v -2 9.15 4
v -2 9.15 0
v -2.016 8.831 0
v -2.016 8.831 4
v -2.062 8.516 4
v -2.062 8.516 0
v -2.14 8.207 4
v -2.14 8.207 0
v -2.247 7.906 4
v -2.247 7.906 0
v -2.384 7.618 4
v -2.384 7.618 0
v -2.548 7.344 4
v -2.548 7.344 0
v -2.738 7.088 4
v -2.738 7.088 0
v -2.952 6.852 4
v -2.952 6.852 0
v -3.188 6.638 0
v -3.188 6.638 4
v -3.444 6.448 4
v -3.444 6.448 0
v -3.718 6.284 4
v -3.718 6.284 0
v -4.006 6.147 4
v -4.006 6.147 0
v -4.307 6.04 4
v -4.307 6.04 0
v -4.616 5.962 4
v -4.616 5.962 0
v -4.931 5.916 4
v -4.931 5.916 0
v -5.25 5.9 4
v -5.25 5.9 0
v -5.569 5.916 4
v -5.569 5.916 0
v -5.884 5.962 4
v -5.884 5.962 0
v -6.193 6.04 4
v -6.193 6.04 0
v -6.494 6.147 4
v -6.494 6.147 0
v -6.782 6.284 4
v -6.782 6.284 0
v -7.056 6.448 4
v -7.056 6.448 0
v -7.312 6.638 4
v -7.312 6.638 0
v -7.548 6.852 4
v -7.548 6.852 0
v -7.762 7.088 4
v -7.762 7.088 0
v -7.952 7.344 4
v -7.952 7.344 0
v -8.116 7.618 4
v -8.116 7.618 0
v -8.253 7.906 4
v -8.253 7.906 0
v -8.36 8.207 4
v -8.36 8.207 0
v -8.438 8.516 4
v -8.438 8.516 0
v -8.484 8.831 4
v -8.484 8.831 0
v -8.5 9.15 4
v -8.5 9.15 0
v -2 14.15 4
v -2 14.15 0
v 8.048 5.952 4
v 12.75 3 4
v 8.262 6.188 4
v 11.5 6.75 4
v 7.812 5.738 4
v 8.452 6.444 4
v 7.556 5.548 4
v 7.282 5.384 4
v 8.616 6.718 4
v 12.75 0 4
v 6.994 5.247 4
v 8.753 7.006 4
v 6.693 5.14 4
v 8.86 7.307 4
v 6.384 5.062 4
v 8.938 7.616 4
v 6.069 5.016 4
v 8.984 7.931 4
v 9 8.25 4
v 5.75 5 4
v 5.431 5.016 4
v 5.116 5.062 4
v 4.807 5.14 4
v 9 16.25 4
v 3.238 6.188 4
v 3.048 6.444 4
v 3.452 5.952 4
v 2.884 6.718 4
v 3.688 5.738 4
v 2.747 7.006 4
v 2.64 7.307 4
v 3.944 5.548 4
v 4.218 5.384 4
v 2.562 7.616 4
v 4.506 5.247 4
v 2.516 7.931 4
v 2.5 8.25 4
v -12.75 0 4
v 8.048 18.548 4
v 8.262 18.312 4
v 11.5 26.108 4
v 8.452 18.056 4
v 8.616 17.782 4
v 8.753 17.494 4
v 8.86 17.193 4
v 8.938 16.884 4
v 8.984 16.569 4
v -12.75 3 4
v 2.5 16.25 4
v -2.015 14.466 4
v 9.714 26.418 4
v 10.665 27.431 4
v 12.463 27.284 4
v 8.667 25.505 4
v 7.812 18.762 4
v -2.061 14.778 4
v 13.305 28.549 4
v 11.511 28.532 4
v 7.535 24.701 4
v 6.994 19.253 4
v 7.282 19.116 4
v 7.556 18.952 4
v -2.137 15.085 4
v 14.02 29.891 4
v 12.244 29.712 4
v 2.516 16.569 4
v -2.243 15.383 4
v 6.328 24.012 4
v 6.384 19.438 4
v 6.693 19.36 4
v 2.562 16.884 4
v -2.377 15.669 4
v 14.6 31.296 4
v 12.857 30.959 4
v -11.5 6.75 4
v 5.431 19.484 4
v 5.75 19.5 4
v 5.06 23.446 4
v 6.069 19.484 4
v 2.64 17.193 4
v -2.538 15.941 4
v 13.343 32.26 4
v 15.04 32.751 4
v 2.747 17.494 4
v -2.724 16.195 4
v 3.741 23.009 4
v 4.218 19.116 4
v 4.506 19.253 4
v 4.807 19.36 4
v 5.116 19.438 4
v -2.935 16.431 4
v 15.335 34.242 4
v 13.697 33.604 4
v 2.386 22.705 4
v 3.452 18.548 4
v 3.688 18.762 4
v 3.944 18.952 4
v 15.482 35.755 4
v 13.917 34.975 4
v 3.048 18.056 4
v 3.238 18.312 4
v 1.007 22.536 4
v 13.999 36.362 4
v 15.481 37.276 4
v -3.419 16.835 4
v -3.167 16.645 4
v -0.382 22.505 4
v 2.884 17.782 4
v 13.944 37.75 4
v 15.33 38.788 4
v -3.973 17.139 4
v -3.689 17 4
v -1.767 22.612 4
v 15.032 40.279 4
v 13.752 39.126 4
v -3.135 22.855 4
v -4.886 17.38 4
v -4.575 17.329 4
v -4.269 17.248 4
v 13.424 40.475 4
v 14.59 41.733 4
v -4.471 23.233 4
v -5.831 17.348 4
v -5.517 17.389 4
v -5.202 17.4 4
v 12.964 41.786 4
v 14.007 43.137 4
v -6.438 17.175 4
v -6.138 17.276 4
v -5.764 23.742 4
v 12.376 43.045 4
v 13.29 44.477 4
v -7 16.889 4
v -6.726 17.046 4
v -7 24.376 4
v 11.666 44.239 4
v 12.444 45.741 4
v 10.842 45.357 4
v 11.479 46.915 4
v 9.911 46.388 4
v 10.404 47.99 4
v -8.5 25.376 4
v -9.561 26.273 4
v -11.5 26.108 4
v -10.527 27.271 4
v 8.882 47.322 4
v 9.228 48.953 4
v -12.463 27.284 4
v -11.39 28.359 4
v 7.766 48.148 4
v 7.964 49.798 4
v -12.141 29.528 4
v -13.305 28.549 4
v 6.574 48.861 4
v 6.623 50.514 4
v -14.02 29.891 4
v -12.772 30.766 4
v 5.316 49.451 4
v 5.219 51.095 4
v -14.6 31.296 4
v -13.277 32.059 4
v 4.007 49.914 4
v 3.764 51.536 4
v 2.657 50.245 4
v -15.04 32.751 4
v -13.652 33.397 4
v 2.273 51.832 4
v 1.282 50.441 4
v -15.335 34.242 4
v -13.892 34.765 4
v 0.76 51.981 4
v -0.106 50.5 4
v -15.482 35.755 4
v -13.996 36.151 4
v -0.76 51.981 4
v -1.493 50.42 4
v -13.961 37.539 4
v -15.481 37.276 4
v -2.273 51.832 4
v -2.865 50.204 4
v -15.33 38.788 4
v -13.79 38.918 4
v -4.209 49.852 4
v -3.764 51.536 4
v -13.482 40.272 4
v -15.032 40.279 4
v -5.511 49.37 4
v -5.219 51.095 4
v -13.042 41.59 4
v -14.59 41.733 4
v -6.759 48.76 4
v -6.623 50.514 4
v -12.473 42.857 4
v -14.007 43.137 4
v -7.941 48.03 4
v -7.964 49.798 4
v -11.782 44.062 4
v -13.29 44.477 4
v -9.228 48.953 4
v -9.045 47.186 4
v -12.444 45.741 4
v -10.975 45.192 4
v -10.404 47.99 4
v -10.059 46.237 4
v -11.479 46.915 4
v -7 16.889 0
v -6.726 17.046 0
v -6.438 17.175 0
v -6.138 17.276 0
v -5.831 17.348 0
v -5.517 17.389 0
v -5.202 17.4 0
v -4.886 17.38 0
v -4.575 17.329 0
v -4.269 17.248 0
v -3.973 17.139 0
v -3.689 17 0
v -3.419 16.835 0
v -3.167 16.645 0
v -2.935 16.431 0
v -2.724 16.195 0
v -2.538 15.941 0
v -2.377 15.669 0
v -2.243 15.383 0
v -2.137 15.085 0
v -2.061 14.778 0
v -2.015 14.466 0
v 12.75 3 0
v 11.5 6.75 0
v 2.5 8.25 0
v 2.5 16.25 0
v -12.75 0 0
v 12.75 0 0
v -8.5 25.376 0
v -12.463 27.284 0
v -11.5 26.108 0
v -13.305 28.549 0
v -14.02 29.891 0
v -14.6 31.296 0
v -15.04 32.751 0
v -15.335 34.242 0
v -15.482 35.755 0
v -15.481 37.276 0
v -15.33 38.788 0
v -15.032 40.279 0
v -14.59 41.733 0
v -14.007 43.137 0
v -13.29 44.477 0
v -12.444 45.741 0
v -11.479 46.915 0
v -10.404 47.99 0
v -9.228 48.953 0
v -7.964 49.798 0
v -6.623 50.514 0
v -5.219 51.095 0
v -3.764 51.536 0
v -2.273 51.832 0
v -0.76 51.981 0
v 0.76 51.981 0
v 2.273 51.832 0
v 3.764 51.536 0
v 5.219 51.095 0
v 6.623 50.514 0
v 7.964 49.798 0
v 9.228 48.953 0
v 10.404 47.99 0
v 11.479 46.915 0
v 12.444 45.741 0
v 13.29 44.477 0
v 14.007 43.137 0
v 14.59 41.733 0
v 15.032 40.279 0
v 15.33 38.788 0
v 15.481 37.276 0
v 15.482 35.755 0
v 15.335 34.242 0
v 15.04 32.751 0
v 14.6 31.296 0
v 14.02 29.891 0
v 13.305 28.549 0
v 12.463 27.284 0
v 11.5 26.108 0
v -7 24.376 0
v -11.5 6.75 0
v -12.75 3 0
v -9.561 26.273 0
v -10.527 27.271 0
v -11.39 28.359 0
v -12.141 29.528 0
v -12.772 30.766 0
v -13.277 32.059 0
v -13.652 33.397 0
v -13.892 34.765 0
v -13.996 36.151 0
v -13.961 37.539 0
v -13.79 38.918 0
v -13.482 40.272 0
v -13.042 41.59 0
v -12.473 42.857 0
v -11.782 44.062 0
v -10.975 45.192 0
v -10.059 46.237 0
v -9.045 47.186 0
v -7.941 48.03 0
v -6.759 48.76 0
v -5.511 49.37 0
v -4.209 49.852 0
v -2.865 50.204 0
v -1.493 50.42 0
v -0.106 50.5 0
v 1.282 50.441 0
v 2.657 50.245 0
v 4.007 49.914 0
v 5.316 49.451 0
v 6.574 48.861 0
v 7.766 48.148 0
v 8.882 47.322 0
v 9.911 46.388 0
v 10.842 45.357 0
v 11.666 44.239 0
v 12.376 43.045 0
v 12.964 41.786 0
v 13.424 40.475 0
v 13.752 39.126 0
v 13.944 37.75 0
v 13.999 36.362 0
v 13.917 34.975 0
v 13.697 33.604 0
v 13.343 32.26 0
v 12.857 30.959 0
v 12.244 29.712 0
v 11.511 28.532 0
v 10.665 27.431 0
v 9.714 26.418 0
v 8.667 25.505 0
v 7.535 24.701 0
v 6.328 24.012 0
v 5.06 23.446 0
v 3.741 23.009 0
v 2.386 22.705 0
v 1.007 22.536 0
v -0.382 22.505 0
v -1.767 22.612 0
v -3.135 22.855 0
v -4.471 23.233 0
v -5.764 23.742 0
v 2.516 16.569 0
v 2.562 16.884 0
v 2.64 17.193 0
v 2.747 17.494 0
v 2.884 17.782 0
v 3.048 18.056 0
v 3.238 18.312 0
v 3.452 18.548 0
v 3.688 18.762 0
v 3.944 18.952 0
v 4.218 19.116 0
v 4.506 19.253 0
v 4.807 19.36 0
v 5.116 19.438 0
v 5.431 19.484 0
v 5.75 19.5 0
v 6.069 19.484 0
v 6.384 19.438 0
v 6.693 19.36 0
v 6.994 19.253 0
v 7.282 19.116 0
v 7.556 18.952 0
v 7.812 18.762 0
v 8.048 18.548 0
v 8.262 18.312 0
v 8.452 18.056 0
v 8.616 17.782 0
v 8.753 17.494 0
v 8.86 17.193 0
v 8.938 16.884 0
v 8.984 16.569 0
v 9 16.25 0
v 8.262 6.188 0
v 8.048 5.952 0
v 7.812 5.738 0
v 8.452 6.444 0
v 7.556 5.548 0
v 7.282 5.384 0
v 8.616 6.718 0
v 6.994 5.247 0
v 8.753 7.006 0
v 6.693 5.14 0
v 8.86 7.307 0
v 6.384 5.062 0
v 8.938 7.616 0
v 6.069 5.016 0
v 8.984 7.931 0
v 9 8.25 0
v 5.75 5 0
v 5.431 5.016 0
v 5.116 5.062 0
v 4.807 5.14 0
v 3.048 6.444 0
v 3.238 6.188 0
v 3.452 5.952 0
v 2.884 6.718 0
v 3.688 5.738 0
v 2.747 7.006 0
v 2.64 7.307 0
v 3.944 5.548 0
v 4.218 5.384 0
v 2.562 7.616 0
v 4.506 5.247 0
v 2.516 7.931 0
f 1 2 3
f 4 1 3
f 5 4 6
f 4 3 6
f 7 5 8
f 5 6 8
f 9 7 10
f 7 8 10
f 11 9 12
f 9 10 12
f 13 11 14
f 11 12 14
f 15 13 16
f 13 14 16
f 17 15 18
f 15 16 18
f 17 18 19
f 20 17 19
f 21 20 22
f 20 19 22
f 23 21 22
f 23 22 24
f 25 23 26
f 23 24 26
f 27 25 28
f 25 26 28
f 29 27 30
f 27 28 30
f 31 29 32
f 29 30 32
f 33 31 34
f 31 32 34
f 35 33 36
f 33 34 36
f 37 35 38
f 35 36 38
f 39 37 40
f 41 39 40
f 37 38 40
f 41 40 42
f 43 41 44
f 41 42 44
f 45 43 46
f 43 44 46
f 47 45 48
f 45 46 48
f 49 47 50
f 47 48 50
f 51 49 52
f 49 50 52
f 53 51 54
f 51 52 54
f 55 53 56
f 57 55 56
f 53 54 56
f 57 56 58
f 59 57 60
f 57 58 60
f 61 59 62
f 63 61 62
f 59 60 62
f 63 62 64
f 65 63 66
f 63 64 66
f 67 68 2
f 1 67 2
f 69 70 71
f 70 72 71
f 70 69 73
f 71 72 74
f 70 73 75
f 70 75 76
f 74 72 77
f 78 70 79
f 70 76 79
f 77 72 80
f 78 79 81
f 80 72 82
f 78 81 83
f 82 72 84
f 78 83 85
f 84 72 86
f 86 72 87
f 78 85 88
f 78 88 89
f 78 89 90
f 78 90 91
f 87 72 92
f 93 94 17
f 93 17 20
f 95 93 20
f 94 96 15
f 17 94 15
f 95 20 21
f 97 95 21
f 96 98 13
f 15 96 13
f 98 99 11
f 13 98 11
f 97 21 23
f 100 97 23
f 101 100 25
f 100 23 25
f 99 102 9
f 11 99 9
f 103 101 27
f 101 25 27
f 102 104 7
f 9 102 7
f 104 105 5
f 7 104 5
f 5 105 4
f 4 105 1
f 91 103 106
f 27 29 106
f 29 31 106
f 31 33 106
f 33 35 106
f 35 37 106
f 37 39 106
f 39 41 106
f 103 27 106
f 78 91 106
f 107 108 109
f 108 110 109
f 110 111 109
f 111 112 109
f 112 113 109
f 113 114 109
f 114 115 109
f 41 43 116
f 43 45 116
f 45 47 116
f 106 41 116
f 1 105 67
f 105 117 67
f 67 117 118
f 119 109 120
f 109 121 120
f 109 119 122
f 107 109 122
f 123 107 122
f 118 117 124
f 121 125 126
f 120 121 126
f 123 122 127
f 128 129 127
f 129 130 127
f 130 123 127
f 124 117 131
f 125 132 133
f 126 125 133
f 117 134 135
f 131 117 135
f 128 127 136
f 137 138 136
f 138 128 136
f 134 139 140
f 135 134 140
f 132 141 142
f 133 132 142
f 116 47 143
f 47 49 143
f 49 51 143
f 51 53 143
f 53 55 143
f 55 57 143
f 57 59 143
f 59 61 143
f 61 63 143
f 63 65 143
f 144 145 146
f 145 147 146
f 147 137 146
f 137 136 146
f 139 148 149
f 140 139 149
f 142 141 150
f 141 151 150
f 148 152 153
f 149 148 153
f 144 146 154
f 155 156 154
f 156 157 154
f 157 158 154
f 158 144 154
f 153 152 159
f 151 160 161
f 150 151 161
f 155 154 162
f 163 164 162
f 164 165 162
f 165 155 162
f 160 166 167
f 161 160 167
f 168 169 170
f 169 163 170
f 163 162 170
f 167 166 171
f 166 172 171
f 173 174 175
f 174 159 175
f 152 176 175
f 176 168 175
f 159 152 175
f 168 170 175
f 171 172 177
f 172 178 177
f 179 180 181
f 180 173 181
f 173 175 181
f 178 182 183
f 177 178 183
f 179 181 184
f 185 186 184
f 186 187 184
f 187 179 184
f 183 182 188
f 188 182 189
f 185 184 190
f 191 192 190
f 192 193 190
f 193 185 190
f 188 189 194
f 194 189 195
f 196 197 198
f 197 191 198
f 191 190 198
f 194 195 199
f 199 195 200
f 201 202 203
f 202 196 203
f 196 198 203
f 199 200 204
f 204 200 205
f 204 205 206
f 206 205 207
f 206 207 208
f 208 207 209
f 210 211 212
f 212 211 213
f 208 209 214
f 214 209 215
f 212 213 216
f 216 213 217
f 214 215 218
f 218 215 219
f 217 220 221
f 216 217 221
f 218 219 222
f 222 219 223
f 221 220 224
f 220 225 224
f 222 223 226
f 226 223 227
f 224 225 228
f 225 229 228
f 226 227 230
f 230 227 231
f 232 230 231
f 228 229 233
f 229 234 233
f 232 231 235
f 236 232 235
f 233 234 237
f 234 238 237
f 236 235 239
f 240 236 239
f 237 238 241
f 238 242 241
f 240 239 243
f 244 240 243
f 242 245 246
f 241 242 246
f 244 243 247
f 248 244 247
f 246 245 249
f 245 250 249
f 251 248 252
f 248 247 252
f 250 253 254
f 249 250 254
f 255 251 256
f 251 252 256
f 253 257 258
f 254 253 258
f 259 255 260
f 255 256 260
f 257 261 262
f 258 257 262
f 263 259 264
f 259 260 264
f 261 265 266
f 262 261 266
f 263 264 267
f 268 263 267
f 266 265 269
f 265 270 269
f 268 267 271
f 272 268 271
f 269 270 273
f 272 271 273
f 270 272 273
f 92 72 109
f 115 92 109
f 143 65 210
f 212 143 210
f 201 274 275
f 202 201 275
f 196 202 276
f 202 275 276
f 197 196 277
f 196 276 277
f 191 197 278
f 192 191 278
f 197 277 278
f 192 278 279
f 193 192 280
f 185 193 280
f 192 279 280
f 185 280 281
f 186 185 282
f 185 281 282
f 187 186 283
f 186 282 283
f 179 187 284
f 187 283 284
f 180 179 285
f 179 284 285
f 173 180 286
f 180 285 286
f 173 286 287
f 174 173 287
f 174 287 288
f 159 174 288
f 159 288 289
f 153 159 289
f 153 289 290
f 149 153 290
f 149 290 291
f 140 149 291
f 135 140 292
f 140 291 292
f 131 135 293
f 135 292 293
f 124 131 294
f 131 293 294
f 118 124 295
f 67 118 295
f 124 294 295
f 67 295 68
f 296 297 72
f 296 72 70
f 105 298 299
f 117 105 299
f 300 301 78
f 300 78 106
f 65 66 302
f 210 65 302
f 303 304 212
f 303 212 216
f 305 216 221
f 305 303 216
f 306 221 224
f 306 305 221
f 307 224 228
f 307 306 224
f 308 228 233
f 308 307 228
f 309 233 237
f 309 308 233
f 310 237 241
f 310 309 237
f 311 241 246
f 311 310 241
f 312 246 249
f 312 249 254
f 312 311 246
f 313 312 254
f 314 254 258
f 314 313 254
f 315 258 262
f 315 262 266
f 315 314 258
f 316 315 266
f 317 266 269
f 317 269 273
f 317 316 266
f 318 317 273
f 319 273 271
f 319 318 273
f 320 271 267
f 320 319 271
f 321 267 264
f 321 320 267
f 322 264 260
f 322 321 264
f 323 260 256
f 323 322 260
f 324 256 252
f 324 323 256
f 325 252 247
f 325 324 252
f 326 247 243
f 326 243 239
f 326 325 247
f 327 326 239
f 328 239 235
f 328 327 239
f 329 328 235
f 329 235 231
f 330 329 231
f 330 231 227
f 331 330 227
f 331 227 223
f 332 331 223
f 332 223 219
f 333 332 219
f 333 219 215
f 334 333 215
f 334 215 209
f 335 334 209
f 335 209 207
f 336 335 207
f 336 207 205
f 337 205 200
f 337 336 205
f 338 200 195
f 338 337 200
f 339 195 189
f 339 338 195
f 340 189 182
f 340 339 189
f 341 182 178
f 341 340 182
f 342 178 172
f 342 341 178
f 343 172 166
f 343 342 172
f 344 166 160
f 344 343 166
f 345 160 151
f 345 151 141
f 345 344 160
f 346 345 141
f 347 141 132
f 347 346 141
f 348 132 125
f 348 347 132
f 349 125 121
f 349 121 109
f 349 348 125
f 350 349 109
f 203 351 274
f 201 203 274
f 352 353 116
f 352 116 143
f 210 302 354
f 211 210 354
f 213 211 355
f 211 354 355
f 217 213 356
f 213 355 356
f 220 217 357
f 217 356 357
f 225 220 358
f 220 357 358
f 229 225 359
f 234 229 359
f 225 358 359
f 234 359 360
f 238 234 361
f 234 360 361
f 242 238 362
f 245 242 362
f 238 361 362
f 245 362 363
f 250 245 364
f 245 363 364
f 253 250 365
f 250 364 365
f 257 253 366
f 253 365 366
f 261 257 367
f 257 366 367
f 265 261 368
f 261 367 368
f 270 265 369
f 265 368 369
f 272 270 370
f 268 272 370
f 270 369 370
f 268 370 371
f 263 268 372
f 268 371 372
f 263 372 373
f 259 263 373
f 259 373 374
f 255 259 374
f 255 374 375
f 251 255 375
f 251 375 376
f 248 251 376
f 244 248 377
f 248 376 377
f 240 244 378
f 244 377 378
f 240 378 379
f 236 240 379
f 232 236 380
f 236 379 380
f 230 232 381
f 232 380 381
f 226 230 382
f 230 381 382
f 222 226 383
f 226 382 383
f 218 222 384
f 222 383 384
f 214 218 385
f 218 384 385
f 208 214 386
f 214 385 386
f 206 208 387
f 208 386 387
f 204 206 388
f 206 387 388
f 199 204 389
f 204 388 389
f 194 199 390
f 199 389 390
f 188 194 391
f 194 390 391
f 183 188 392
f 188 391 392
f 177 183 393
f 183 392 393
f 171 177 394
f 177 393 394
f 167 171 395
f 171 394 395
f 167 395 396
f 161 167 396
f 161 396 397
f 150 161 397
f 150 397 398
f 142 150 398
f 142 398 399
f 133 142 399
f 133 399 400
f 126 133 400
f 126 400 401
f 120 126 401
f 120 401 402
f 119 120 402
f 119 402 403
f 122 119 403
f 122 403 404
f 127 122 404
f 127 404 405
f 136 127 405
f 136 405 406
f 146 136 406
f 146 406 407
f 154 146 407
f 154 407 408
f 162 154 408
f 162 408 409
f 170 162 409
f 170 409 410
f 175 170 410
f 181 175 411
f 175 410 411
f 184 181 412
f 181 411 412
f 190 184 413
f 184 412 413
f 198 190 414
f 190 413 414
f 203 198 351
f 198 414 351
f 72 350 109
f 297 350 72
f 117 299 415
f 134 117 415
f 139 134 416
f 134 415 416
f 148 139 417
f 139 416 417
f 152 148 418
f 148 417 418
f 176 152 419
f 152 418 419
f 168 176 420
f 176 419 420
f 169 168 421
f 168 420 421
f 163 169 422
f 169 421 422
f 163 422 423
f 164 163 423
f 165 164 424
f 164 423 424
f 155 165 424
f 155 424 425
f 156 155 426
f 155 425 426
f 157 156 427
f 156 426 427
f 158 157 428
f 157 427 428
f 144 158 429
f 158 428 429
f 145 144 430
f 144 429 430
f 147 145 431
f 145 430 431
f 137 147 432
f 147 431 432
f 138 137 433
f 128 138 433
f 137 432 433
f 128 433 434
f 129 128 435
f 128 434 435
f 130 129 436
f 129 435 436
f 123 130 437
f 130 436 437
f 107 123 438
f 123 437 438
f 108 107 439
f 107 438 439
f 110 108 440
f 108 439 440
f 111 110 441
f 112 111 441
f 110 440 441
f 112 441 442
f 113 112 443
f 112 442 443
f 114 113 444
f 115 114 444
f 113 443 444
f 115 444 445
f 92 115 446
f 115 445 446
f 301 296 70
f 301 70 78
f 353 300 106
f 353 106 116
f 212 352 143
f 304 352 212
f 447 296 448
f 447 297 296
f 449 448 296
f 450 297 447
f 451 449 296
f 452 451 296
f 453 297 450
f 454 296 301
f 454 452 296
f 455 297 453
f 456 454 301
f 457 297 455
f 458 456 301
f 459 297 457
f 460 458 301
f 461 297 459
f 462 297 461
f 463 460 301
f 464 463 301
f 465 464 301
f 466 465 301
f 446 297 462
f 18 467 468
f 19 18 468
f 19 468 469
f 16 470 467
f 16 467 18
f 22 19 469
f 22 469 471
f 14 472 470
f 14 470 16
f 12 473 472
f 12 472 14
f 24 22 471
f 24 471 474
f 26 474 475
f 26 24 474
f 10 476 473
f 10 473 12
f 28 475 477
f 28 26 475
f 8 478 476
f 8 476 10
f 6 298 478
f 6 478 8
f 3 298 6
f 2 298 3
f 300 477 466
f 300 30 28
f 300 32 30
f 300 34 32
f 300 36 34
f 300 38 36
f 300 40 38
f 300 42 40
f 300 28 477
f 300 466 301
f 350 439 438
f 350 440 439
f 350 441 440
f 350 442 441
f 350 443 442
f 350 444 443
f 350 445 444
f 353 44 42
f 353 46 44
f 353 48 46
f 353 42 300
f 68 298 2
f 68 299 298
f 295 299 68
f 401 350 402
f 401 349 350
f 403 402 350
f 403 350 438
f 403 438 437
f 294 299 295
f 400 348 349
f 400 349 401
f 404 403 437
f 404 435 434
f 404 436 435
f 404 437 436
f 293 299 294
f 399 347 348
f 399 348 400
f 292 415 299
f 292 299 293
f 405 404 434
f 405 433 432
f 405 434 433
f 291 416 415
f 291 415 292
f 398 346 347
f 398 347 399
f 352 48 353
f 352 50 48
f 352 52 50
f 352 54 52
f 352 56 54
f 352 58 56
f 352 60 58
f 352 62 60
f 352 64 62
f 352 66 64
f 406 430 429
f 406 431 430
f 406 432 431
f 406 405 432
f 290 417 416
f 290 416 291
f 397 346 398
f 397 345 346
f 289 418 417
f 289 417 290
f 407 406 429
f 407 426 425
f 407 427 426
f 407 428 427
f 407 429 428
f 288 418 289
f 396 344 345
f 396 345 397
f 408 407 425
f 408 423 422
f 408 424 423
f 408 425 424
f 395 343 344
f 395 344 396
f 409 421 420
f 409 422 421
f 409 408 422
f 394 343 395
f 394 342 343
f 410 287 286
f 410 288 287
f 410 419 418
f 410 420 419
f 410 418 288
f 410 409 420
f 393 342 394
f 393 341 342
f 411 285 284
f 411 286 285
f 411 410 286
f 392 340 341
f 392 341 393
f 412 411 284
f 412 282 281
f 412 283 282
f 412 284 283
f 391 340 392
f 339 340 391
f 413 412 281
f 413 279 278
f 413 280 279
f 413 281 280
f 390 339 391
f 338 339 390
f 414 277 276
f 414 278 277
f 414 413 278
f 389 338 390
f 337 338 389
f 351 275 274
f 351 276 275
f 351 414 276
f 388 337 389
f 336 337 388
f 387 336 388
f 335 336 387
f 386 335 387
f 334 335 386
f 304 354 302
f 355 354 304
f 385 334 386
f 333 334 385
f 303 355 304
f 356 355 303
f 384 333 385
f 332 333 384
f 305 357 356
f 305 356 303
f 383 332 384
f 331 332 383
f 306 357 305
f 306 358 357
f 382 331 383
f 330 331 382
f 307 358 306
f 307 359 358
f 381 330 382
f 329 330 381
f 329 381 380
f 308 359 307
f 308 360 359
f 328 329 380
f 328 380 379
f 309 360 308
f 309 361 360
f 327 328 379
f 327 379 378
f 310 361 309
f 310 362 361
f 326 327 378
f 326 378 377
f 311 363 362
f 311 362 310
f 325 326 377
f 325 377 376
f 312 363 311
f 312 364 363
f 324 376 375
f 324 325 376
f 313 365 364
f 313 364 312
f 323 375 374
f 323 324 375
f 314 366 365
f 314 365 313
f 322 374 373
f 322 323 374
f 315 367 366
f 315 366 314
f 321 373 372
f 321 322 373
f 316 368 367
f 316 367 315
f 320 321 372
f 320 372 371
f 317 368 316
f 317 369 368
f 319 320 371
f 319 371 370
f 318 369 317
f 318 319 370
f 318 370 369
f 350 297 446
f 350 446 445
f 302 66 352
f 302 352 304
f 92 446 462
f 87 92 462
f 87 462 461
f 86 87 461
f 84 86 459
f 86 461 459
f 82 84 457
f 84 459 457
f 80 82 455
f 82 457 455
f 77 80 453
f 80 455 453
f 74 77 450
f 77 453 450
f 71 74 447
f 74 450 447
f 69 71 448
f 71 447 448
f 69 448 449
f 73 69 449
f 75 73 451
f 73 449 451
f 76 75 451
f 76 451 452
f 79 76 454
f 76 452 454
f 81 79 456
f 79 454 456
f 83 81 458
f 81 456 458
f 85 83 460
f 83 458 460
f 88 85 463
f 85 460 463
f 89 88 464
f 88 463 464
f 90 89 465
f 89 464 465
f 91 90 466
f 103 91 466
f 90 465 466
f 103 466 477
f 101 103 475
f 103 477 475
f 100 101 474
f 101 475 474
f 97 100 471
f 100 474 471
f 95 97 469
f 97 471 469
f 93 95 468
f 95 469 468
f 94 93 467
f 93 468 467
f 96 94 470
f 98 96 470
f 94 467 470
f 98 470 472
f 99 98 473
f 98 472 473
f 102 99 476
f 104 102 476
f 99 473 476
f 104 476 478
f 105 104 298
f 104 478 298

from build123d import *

# Parameters (mm, degrees)
DODANIE_WYCI_GNI_CIE1_DEPTH = 4


with BuildPart() as part:
    # Szkic1 → Dodanie-wyciągnięcie1 (new body)
    with BuildSketch(Plane.XY):
        with BuildLine():
            Line((12.75, 0), (-12.75, 0))
            Line((-12.75, 0), (-12.75, 3))
            Line((-12.75, 3), (-11.5, 6.75))
            Line((-11.5, 6.75), (-11.5, 26.107695155))
            ThreePointArc((-11.5, 26.107695155), (0, 52), (11.5, 26.107695155))
            Line((11.5, 26.107695155), (11.5, 6.75))
            Line((11.5, 6.75), (12.75, 3))
            Line((12.75, 3), (12.75, 0))
        make_face()
        with BuildLine():
            Line((-2, 14.15), (-2, 9.15))
            ThreePointArc((-2, 9.15), (-5.25, 5.9), (-8.5, 9.15))
            Line((-8.5, 9.15), (-8.5, 14.15))
            Line((-8.5, 14.15), (-8.5, 25.375702269))
            ThreePointArc((-8.5, 25.375702269), (7.766114148, 48.148496514), (-7, 24.375644347))
            Line((-7, 24.375644347), (-7, 16.888612788))
            ThreePointArc((-7, 16.888612788), (-3.6887505, 17.000438563), (-2, 14.15))
        make_face(mode=Mode.SUBTRACT)
        with BuildLine():
            Line((9, 16.25), (9, 8.25))
            ThreePointArc((9, 8.25), (5.75, 5), (2.5, 8.25))
            Line((2.5, 8.25), (2.5, 16.25))
            ThreePointArc((2.5, 16.25), (5.75, 19.5), (9, 16.25))
        make_face(mode=Mode.SUBTRACT)
    extrude(amount=DODANIE_WYCI_GNI_CIE1_DEPTH)


solid = part.part
